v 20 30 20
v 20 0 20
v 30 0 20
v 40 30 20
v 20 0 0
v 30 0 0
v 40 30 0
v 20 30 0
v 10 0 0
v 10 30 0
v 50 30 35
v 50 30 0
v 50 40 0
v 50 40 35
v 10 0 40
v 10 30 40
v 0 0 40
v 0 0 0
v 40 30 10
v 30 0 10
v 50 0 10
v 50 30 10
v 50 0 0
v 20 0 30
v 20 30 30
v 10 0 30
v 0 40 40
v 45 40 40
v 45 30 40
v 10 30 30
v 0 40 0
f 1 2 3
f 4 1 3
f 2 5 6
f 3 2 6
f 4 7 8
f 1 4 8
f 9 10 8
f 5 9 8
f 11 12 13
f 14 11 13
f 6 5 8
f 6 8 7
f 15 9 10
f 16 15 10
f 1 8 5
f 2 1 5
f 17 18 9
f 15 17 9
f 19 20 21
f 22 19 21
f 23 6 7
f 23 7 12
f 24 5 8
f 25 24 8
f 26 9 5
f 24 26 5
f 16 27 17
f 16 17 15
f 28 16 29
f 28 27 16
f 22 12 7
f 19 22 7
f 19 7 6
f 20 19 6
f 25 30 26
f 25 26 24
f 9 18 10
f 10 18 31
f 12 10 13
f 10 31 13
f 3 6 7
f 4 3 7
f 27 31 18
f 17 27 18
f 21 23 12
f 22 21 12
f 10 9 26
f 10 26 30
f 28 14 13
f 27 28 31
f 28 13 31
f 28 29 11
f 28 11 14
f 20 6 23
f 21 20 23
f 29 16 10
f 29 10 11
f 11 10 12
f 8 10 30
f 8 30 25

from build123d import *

# Parameters (mm, degrees)
F1_DEPTH = 40
F0_W     = 10
F0_H     = 30
F2_DEPTH = 30
F3_DEPTH = 20
F4_DEPTH = 10
F5_SIZE  = 5


with BuildPart() as f1:
    # F0 (on Top) → F1 (new body)
    with BuildSketch(Plane.XY):
        Polygon((0, 40), (0, 0), (10, 0), (10, 30), (20, 30), (40, 30), (50, 30), (50, 40), align=None)
    extrude(amount=F1_DEPTH)

    # F5
    f5_edges = [f1.edges().sort_by_distance(p)[0] for p in [
        (50, 35, 40),
    ]]
    chamfer(f5_edges, length=F5_SIZE)


with BuildPart() as f2:
    # F0 (on Top) → F2 (new body)
    with BuildSketch(Plane.XY):
        with Locations((15, 15)):
            Rectangle(F0_W, F0_H)
    extrude(amount=F2_DEPTH)


with BuildPart() as f3:
    # F0 (on Top) → F3 (new body)
    with BuildSketch(Plane.XY):
        Polygon((20, 30), (20, 0), (30, 0), (40, 30), align=None)
    extrude(amount=F3_DEPTH)


with BuildPart() as f4:
    # F0 (on Top) → F4 (new body)
    with BuildSketch(Plane.XY):
        Polygon((40, 30), (30, 0), (50, 0), (50, 30), align=None)
    extrude(amount=F4_DEPTH)


solid = Compound([f1.part, f2.part, f3.part, f4.part])
